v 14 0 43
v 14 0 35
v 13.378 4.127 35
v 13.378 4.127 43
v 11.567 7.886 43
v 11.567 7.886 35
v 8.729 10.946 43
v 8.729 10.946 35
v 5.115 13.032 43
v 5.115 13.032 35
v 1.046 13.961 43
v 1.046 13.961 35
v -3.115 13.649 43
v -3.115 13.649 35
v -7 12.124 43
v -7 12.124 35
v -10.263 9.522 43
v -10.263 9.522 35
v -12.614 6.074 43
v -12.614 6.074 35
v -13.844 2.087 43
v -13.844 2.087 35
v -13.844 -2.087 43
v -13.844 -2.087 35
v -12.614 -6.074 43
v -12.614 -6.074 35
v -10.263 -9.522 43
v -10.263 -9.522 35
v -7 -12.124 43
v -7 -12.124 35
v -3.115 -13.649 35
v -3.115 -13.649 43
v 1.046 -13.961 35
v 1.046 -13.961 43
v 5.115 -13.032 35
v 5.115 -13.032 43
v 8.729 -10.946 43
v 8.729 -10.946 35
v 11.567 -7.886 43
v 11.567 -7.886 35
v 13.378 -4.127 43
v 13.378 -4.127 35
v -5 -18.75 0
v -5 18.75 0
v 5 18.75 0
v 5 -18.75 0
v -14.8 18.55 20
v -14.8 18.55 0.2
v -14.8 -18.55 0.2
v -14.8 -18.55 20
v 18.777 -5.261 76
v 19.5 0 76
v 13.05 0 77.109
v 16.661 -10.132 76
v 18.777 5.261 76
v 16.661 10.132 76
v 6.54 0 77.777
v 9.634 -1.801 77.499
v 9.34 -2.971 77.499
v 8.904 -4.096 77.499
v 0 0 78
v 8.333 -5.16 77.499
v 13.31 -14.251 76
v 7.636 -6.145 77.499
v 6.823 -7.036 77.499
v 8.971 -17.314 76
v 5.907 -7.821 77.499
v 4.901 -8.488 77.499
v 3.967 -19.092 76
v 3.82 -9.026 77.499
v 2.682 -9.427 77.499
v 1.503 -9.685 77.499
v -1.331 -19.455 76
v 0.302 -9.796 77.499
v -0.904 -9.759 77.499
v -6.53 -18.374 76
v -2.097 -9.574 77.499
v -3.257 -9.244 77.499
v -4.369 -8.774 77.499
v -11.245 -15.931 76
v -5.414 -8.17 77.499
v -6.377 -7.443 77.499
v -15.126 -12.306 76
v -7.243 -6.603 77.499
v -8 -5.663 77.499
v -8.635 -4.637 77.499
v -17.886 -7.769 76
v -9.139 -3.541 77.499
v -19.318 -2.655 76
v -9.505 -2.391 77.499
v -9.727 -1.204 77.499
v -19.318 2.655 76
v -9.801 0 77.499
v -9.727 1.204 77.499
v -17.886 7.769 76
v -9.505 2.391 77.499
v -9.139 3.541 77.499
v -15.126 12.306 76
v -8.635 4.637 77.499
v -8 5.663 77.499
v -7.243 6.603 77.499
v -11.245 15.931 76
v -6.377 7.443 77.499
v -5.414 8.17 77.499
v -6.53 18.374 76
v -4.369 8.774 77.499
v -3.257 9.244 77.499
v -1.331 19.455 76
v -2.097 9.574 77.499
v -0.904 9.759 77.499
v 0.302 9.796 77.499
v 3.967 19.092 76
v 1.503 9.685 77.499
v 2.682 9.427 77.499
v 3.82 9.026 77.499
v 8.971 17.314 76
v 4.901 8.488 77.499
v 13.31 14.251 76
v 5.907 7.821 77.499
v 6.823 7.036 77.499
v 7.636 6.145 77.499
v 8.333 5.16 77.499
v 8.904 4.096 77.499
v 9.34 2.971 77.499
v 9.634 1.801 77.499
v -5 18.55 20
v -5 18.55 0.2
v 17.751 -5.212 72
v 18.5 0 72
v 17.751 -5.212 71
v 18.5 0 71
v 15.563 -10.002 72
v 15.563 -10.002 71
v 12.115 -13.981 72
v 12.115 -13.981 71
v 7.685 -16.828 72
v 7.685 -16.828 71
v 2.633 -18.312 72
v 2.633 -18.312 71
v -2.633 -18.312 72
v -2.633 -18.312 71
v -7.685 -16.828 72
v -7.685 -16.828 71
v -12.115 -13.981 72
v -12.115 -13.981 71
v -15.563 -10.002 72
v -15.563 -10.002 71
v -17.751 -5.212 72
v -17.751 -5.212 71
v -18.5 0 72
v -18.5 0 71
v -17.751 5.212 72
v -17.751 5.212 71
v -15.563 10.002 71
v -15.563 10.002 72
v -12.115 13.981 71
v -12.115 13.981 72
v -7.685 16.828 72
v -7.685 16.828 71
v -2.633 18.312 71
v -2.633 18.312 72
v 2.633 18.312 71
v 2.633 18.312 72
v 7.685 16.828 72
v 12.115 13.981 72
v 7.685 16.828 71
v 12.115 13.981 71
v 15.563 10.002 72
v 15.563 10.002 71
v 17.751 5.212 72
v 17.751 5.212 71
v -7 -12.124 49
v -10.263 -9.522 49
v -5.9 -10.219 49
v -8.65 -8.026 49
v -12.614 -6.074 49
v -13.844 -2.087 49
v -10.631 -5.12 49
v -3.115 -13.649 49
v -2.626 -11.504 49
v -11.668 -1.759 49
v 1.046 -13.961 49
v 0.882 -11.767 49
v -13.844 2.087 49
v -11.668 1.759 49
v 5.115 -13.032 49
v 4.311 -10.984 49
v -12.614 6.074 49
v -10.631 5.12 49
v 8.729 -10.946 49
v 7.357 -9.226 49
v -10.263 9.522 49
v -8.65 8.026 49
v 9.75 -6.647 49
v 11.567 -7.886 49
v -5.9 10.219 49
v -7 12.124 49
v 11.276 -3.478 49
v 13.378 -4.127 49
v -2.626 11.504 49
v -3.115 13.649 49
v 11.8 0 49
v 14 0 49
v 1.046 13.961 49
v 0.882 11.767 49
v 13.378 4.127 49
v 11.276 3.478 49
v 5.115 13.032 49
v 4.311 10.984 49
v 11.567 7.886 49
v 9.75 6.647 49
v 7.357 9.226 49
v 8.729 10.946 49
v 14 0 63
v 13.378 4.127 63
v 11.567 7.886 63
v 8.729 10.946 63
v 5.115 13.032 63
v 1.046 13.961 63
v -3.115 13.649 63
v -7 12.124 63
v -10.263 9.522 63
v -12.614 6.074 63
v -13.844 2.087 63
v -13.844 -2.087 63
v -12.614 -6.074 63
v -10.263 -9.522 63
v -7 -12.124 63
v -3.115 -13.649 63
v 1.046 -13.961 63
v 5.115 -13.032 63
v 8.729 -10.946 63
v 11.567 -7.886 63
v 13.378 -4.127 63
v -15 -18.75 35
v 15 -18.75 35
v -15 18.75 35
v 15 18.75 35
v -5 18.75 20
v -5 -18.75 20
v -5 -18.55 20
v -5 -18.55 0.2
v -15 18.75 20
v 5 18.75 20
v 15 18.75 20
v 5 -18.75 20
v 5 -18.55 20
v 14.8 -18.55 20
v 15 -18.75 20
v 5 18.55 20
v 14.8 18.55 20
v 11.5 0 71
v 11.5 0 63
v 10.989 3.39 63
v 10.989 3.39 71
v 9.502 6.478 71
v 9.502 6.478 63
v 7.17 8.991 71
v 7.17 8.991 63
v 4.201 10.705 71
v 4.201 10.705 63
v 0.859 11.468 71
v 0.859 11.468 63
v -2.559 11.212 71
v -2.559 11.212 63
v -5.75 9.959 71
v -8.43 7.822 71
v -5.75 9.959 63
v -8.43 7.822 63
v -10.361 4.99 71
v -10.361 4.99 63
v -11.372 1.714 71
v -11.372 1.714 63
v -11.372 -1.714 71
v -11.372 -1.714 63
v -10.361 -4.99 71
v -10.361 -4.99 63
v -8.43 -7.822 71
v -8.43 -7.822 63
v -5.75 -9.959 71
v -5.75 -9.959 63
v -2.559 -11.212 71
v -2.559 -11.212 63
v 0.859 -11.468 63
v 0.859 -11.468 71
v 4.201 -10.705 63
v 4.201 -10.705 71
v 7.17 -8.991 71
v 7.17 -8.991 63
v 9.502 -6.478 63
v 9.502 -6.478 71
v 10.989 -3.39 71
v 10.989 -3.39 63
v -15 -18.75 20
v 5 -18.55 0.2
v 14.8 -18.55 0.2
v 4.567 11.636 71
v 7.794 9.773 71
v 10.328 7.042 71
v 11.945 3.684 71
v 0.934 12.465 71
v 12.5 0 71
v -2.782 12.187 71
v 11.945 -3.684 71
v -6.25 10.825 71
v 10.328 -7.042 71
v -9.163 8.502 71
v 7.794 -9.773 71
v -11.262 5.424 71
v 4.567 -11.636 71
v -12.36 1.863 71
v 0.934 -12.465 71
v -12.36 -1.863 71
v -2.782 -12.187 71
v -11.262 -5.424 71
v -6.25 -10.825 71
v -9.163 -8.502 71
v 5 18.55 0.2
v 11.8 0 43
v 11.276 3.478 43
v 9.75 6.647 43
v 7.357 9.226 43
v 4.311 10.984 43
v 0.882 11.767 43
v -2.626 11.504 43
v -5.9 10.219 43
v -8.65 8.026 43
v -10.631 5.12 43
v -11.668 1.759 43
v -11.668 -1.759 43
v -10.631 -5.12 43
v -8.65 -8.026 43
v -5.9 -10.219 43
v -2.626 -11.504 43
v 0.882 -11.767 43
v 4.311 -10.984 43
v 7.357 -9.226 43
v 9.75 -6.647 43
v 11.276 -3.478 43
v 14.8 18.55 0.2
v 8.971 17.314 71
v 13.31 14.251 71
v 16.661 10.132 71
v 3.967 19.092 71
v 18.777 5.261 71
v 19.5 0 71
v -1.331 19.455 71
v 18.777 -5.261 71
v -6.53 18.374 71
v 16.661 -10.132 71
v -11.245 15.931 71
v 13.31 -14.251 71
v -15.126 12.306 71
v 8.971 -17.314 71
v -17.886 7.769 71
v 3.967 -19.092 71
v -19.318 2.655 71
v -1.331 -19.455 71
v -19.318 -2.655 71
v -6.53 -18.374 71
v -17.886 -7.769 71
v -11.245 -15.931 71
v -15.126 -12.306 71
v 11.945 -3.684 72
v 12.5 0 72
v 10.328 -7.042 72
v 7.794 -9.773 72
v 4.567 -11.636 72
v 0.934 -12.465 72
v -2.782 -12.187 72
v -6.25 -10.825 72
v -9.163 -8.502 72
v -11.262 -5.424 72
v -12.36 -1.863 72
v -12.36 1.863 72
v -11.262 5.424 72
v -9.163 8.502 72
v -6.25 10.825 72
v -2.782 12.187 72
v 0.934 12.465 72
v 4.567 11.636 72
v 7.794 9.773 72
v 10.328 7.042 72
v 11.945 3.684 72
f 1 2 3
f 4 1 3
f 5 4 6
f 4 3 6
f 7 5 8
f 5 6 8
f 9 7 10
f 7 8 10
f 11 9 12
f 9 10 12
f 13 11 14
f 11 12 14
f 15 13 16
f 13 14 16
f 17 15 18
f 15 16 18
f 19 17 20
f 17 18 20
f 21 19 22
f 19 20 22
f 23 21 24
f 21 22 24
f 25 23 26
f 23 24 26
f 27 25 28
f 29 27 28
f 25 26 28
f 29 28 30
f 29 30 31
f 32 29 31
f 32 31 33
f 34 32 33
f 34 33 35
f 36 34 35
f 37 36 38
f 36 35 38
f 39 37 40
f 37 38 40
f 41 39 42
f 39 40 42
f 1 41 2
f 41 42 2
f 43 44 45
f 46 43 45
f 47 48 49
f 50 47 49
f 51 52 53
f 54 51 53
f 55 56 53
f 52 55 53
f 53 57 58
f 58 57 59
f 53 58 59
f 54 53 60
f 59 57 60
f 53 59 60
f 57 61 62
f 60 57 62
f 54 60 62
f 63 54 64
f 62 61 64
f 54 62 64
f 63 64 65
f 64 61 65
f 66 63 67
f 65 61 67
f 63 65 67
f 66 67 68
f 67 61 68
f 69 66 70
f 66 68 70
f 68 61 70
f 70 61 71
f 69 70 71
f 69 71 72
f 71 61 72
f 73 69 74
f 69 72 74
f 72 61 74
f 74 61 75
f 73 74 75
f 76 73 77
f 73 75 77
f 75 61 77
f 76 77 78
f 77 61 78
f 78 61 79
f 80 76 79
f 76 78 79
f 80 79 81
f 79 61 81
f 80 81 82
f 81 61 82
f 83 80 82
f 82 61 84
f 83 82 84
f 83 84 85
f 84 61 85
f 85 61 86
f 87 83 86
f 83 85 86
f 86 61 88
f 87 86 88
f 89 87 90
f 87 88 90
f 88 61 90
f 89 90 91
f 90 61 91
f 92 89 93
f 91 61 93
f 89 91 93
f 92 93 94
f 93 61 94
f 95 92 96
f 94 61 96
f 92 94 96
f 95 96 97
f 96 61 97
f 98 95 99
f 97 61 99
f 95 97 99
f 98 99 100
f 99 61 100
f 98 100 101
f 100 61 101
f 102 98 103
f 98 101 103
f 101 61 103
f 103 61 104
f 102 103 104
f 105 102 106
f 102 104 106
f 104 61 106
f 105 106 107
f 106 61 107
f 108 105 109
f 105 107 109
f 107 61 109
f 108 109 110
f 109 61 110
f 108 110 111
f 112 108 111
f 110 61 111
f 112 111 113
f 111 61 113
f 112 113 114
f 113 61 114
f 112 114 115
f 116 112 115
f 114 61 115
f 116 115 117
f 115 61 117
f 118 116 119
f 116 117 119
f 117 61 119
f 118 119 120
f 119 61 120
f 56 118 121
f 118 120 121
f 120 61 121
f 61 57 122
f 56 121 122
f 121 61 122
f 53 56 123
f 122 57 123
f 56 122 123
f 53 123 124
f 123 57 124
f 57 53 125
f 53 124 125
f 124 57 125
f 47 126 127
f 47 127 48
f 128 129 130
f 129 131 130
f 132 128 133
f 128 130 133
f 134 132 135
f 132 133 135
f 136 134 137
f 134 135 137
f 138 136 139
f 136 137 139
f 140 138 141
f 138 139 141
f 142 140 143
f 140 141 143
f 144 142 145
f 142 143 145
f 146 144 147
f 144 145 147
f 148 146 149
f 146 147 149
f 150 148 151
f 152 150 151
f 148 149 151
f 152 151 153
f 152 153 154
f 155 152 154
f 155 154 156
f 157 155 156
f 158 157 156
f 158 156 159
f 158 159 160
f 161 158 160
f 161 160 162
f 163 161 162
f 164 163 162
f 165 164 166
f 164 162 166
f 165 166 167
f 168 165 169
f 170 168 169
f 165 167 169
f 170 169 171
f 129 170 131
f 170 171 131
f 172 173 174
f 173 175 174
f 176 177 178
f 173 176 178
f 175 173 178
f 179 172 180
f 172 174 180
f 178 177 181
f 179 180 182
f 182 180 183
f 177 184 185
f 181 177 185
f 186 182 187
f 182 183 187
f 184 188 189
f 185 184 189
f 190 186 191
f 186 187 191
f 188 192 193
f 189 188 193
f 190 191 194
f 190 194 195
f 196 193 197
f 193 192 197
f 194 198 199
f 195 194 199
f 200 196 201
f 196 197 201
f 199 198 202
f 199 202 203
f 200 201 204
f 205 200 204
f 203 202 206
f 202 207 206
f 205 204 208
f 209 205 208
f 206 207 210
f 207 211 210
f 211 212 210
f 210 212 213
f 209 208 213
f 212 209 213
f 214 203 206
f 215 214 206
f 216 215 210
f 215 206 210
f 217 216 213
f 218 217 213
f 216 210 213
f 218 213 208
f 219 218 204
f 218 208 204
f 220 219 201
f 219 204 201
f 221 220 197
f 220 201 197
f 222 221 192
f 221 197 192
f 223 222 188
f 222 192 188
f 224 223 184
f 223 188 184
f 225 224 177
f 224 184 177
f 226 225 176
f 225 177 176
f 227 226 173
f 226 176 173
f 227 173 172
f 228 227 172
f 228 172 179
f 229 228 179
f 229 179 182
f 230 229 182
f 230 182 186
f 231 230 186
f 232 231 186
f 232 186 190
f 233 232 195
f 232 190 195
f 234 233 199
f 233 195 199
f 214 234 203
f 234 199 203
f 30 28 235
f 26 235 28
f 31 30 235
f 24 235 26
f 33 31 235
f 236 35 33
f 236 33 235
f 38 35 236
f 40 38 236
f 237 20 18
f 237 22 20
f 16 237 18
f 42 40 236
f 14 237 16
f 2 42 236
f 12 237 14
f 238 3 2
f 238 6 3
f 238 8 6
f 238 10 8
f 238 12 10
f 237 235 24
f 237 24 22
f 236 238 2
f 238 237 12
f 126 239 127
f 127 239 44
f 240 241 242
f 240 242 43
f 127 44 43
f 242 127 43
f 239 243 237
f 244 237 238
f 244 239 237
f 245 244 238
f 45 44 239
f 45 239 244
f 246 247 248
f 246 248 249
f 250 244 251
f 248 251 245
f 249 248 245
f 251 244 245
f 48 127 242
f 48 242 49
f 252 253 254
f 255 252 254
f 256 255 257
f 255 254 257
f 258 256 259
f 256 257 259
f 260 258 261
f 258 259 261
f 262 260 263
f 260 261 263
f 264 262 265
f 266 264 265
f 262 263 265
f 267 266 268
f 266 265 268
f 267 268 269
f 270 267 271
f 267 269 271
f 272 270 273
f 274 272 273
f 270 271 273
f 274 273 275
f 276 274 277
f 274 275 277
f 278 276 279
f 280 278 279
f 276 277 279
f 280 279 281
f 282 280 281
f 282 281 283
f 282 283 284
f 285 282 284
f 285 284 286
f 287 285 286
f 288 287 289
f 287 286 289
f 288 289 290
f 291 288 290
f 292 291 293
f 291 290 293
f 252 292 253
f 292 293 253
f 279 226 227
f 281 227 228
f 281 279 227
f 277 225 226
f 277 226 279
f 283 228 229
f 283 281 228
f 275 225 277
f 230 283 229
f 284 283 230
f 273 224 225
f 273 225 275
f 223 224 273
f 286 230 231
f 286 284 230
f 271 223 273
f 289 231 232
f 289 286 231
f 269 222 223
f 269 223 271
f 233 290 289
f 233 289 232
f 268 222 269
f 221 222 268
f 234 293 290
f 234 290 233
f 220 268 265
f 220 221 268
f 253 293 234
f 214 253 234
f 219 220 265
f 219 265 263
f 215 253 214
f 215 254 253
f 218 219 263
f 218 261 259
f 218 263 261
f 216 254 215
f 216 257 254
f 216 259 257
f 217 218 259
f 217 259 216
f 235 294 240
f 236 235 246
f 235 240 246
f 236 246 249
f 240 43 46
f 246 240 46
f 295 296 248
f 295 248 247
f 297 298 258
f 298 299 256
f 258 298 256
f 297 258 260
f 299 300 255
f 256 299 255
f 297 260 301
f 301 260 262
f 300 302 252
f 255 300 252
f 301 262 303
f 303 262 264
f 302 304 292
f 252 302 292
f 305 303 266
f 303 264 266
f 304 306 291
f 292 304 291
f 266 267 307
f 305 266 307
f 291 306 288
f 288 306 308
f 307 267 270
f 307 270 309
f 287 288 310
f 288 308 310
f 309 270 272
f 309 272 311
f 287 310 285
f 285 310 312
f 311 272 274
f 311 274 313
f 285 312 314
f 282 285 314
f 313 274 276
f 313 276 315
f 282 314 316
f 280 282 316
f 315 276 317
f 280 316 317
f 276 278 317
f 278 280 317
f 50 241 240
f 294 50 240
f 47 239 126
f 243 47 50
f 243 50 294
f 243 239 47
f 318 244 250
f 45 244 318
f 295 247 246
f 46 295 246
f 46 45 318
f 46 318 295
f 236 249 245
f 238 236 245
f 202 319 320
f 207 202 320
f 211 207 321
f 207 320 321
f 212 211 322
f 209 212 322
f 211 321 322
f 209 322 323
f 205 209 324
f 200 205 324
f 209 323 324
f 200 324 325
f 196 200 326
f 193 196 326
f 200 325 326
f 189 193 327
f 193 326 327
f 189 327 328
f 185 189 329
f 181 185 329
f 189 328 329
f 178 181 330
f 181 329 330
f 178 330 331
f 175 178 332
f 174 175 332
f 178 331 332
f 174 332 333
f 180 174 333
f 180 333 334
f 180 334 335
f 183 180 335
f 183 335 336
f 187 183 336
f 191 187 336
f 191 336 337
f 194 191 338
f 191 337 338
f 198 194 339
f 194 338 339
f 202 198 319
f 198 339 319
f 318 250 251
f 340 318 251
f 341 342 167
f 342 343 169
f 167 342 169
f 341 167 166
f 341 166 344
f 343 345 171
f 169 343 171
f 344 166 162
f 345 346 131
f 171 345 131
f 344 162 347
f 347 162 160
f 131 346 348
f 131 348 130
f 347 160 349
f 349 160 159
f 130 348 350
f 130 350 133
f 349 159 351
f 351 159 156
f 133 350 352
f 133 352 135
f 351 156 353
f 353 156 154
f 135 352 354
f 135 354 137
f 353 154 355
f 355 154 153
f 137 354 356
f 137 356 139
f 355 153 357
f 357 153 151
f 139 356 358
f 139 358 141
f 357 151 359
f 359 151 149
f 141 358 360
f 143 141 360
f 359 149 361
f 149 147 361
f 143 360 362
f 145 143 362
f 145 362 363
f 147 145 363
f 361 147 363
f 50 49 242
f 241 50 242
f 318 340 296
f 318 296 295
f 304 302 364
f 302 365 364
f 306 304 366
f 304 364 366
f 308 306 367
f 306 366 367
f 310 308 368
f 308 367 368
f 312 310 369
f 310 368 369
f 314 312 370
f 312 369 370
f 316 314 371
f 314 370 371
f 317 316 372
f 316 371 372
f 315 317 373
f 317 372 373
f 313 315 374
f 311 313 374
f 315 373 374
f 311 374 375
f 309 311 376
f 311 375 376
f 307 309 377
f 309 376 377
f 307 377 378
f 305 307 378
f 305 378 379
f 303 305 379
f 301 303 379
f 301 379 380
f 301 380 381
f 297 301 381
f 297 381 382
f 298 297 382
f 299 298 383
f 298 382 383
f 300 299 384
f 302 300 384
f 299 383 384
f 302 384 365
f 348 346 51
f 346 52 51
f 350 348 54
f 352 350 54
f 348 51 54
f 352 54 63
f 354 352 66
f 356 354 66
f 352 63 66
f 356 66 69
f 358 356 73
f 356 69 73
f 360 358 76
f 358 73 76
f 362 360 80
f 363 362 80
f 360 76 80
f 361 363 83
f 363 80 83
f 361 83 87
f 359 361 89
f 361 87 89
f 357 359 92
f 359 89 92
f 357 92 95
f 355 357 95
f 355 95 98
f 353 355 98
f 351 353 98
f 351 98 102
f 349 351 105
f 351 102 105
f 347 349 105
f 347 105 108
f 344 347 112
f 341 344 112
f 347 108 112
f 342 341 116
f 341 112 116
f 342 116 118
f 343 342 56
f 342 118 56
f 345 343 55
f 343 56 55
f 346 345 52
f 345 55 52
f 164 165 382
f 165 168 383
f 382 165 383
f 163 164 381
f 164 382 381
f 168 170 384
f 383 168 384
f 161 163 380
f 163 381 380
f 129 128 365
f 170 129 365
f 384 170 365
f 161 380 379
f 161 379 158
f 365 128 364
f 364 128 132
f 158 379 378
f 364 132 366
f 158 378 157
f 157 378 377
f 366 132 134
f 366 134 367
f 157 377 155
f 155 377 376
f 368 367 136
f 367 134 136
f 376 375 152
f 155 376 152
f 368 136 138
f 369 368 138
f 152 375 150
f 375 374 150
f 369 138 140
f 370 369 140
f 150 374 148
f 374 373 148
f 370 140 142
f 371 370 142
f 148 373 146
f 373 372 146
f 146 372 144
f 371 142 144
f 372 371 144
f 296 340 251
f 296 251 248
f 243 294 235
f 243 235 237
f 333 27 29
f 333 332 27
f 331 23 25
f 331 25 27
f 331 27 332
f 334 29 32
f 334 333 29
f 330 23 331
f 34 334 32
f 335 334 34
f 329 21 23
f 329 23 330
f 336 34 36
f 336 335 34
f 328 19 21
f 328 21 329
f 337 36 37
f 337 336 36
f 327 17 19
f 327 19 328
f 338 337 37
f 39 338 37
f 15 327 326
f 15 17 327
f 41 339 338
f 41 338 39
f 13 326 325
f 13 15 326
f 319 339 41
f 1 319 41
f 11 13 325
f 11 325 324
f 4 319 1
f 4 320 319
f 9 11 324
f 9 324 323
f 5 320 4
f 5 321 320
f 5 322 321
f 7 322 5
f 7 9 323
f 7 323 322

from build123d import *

# Parameters (mm, degrees)
ESQUISSE1_W             = 30
ESQUISSE1_H             = 37.5
BOSS_EXTRU_1_DEPTH      = 35
ESQUISSE2_R             = 14
BOSS_EXTRU_2_DEPTH      = 8
ESQUISSE3_R             = 11.8
BOSS_EXTRU_3_DEPTH      = 6
ESQUISSE4_R             = 14
BOSS_EXTRU_4_DEPTH      = 14
ESQUISSE5_R             = 11.5
BOSS_EXTRU_5_DEPTH      = 8
ENL_V_MAT_EXTRU_1_DEPTH = 20
ESQUISSE9_W             = 9.8
ESQUISSE9_H             = 37.1
ENL_V_MAT_EXTRU_2_DEPTH = 0.2


with BuildPart() as part:
    # Esquisse1 → Boss.-Extru.1 (new body)
    with BuildSketch(Plane.XY):
        Rectangle(ESQUISSE1_W, ESQUISSE1_H)
    extrude(amount=BOSS_EXTRU_1_DEPTH)

    # Esquisse2 → Boss.-Extru.2 (add)
    with BuildSketch(Plane.XY.offset(35)):
        Circle(ESQUISSE2_R)
    extrude(amount=BOSS_EXTRU_2_DEPTH)

    # Esquisse3 → Boss.-Extru.3 (add)
    with BuildSketch(Plane.XY.offset(43)):
        Circle(ESQUISSE3_R)
    extrude(amount=BOSS_EXTRU_3_DEPTH)

    # Esquisse4 → Boss.-Extru.4 (add)
    with BuildSketch(Plane.XY.offset(49)):
        Circle(ESQUISSE4_R)
    extrude(amount=BOSS_EXTRU_4_DEPTH)

    # Esquisse5 → Boss.-Extru.5 (add)
    with BuildSketch(Plane.XY.offset(63)):
        Circle(ESQUISSE5_R)
    extrude(amount=BOSS_EXTRU_5_DEPTH)

    # Esquisse7 → Révolution1 (revolve)
    with BuildSketch(Plane(origin=(0, 0, 0), x_dir=(1, 0, 0), z_dir=(0, 1, 0))):
        with BuildLine():
            Line((0, -71), (12.5, -71))
            Line((12.5, -71), (12.5, -72))
            Line((12.5, -72), (18.5, -72))
            Line((18.5, -72), (18.5, -71))
            Line((18.5, -71), (19.5, -71))
            Line((19.5, -71), (19.5, -76))
            ThreePointArc((19.5, -76), (9.801147892, -77.498691947), (0, -78))
            Line((0, -78), (0, -71))
        make_face()
    revolve(axis=Axis((0, 0, 71), (0, 0, -1)))

    # Esquisse8 → Enlèv. mat.-Extru.1 (cut)
    with BuildSketch(Plane(origin=(0, 0, 0), x_dir=(-1, 0, 0), z_dir=(0, 0, -1))):
        Polygon((-5, 18.75), (-5, 18.55), (-14.8, 18.55), (-14.8, -18.55), (-5, -18.55), (-5, -18.75), (-15, -18.75), (-15, 18.75), align=None)
        Polygon((14.8, -18.55), (5, -18.55), (5, -18.75), (15, -18.75), (15, 18.75), (5, 18.75), (5, 18.55), (14.8, 18.55), align=None)
    extrude(amount=-ENL_V_MAT_EXTRU_1_DEPTH, mode=Mode.SUBTRACT)

    # Esquisse9 → Enlèv. mat.-Extru.2 (cut)
    with BuildSketch(Plane(origin=(0, 0, 0), x_dir=(-1, 0, 0), z_dir=(0, 0, -1))):
        with Locations((-9.9, 0)):
            Rectangle(ESQUISSE9_W, ESQUISSE9_H)
        with Locations((9.9, 0)):
            Rectangle(ESQUISSE9_W, ESQUISSE9_H)
    extrude(amount=-ENL_V_MAT_EXTRU_2_DEPTH, mode=Mode.SUBTRACT)


solid = part.part
